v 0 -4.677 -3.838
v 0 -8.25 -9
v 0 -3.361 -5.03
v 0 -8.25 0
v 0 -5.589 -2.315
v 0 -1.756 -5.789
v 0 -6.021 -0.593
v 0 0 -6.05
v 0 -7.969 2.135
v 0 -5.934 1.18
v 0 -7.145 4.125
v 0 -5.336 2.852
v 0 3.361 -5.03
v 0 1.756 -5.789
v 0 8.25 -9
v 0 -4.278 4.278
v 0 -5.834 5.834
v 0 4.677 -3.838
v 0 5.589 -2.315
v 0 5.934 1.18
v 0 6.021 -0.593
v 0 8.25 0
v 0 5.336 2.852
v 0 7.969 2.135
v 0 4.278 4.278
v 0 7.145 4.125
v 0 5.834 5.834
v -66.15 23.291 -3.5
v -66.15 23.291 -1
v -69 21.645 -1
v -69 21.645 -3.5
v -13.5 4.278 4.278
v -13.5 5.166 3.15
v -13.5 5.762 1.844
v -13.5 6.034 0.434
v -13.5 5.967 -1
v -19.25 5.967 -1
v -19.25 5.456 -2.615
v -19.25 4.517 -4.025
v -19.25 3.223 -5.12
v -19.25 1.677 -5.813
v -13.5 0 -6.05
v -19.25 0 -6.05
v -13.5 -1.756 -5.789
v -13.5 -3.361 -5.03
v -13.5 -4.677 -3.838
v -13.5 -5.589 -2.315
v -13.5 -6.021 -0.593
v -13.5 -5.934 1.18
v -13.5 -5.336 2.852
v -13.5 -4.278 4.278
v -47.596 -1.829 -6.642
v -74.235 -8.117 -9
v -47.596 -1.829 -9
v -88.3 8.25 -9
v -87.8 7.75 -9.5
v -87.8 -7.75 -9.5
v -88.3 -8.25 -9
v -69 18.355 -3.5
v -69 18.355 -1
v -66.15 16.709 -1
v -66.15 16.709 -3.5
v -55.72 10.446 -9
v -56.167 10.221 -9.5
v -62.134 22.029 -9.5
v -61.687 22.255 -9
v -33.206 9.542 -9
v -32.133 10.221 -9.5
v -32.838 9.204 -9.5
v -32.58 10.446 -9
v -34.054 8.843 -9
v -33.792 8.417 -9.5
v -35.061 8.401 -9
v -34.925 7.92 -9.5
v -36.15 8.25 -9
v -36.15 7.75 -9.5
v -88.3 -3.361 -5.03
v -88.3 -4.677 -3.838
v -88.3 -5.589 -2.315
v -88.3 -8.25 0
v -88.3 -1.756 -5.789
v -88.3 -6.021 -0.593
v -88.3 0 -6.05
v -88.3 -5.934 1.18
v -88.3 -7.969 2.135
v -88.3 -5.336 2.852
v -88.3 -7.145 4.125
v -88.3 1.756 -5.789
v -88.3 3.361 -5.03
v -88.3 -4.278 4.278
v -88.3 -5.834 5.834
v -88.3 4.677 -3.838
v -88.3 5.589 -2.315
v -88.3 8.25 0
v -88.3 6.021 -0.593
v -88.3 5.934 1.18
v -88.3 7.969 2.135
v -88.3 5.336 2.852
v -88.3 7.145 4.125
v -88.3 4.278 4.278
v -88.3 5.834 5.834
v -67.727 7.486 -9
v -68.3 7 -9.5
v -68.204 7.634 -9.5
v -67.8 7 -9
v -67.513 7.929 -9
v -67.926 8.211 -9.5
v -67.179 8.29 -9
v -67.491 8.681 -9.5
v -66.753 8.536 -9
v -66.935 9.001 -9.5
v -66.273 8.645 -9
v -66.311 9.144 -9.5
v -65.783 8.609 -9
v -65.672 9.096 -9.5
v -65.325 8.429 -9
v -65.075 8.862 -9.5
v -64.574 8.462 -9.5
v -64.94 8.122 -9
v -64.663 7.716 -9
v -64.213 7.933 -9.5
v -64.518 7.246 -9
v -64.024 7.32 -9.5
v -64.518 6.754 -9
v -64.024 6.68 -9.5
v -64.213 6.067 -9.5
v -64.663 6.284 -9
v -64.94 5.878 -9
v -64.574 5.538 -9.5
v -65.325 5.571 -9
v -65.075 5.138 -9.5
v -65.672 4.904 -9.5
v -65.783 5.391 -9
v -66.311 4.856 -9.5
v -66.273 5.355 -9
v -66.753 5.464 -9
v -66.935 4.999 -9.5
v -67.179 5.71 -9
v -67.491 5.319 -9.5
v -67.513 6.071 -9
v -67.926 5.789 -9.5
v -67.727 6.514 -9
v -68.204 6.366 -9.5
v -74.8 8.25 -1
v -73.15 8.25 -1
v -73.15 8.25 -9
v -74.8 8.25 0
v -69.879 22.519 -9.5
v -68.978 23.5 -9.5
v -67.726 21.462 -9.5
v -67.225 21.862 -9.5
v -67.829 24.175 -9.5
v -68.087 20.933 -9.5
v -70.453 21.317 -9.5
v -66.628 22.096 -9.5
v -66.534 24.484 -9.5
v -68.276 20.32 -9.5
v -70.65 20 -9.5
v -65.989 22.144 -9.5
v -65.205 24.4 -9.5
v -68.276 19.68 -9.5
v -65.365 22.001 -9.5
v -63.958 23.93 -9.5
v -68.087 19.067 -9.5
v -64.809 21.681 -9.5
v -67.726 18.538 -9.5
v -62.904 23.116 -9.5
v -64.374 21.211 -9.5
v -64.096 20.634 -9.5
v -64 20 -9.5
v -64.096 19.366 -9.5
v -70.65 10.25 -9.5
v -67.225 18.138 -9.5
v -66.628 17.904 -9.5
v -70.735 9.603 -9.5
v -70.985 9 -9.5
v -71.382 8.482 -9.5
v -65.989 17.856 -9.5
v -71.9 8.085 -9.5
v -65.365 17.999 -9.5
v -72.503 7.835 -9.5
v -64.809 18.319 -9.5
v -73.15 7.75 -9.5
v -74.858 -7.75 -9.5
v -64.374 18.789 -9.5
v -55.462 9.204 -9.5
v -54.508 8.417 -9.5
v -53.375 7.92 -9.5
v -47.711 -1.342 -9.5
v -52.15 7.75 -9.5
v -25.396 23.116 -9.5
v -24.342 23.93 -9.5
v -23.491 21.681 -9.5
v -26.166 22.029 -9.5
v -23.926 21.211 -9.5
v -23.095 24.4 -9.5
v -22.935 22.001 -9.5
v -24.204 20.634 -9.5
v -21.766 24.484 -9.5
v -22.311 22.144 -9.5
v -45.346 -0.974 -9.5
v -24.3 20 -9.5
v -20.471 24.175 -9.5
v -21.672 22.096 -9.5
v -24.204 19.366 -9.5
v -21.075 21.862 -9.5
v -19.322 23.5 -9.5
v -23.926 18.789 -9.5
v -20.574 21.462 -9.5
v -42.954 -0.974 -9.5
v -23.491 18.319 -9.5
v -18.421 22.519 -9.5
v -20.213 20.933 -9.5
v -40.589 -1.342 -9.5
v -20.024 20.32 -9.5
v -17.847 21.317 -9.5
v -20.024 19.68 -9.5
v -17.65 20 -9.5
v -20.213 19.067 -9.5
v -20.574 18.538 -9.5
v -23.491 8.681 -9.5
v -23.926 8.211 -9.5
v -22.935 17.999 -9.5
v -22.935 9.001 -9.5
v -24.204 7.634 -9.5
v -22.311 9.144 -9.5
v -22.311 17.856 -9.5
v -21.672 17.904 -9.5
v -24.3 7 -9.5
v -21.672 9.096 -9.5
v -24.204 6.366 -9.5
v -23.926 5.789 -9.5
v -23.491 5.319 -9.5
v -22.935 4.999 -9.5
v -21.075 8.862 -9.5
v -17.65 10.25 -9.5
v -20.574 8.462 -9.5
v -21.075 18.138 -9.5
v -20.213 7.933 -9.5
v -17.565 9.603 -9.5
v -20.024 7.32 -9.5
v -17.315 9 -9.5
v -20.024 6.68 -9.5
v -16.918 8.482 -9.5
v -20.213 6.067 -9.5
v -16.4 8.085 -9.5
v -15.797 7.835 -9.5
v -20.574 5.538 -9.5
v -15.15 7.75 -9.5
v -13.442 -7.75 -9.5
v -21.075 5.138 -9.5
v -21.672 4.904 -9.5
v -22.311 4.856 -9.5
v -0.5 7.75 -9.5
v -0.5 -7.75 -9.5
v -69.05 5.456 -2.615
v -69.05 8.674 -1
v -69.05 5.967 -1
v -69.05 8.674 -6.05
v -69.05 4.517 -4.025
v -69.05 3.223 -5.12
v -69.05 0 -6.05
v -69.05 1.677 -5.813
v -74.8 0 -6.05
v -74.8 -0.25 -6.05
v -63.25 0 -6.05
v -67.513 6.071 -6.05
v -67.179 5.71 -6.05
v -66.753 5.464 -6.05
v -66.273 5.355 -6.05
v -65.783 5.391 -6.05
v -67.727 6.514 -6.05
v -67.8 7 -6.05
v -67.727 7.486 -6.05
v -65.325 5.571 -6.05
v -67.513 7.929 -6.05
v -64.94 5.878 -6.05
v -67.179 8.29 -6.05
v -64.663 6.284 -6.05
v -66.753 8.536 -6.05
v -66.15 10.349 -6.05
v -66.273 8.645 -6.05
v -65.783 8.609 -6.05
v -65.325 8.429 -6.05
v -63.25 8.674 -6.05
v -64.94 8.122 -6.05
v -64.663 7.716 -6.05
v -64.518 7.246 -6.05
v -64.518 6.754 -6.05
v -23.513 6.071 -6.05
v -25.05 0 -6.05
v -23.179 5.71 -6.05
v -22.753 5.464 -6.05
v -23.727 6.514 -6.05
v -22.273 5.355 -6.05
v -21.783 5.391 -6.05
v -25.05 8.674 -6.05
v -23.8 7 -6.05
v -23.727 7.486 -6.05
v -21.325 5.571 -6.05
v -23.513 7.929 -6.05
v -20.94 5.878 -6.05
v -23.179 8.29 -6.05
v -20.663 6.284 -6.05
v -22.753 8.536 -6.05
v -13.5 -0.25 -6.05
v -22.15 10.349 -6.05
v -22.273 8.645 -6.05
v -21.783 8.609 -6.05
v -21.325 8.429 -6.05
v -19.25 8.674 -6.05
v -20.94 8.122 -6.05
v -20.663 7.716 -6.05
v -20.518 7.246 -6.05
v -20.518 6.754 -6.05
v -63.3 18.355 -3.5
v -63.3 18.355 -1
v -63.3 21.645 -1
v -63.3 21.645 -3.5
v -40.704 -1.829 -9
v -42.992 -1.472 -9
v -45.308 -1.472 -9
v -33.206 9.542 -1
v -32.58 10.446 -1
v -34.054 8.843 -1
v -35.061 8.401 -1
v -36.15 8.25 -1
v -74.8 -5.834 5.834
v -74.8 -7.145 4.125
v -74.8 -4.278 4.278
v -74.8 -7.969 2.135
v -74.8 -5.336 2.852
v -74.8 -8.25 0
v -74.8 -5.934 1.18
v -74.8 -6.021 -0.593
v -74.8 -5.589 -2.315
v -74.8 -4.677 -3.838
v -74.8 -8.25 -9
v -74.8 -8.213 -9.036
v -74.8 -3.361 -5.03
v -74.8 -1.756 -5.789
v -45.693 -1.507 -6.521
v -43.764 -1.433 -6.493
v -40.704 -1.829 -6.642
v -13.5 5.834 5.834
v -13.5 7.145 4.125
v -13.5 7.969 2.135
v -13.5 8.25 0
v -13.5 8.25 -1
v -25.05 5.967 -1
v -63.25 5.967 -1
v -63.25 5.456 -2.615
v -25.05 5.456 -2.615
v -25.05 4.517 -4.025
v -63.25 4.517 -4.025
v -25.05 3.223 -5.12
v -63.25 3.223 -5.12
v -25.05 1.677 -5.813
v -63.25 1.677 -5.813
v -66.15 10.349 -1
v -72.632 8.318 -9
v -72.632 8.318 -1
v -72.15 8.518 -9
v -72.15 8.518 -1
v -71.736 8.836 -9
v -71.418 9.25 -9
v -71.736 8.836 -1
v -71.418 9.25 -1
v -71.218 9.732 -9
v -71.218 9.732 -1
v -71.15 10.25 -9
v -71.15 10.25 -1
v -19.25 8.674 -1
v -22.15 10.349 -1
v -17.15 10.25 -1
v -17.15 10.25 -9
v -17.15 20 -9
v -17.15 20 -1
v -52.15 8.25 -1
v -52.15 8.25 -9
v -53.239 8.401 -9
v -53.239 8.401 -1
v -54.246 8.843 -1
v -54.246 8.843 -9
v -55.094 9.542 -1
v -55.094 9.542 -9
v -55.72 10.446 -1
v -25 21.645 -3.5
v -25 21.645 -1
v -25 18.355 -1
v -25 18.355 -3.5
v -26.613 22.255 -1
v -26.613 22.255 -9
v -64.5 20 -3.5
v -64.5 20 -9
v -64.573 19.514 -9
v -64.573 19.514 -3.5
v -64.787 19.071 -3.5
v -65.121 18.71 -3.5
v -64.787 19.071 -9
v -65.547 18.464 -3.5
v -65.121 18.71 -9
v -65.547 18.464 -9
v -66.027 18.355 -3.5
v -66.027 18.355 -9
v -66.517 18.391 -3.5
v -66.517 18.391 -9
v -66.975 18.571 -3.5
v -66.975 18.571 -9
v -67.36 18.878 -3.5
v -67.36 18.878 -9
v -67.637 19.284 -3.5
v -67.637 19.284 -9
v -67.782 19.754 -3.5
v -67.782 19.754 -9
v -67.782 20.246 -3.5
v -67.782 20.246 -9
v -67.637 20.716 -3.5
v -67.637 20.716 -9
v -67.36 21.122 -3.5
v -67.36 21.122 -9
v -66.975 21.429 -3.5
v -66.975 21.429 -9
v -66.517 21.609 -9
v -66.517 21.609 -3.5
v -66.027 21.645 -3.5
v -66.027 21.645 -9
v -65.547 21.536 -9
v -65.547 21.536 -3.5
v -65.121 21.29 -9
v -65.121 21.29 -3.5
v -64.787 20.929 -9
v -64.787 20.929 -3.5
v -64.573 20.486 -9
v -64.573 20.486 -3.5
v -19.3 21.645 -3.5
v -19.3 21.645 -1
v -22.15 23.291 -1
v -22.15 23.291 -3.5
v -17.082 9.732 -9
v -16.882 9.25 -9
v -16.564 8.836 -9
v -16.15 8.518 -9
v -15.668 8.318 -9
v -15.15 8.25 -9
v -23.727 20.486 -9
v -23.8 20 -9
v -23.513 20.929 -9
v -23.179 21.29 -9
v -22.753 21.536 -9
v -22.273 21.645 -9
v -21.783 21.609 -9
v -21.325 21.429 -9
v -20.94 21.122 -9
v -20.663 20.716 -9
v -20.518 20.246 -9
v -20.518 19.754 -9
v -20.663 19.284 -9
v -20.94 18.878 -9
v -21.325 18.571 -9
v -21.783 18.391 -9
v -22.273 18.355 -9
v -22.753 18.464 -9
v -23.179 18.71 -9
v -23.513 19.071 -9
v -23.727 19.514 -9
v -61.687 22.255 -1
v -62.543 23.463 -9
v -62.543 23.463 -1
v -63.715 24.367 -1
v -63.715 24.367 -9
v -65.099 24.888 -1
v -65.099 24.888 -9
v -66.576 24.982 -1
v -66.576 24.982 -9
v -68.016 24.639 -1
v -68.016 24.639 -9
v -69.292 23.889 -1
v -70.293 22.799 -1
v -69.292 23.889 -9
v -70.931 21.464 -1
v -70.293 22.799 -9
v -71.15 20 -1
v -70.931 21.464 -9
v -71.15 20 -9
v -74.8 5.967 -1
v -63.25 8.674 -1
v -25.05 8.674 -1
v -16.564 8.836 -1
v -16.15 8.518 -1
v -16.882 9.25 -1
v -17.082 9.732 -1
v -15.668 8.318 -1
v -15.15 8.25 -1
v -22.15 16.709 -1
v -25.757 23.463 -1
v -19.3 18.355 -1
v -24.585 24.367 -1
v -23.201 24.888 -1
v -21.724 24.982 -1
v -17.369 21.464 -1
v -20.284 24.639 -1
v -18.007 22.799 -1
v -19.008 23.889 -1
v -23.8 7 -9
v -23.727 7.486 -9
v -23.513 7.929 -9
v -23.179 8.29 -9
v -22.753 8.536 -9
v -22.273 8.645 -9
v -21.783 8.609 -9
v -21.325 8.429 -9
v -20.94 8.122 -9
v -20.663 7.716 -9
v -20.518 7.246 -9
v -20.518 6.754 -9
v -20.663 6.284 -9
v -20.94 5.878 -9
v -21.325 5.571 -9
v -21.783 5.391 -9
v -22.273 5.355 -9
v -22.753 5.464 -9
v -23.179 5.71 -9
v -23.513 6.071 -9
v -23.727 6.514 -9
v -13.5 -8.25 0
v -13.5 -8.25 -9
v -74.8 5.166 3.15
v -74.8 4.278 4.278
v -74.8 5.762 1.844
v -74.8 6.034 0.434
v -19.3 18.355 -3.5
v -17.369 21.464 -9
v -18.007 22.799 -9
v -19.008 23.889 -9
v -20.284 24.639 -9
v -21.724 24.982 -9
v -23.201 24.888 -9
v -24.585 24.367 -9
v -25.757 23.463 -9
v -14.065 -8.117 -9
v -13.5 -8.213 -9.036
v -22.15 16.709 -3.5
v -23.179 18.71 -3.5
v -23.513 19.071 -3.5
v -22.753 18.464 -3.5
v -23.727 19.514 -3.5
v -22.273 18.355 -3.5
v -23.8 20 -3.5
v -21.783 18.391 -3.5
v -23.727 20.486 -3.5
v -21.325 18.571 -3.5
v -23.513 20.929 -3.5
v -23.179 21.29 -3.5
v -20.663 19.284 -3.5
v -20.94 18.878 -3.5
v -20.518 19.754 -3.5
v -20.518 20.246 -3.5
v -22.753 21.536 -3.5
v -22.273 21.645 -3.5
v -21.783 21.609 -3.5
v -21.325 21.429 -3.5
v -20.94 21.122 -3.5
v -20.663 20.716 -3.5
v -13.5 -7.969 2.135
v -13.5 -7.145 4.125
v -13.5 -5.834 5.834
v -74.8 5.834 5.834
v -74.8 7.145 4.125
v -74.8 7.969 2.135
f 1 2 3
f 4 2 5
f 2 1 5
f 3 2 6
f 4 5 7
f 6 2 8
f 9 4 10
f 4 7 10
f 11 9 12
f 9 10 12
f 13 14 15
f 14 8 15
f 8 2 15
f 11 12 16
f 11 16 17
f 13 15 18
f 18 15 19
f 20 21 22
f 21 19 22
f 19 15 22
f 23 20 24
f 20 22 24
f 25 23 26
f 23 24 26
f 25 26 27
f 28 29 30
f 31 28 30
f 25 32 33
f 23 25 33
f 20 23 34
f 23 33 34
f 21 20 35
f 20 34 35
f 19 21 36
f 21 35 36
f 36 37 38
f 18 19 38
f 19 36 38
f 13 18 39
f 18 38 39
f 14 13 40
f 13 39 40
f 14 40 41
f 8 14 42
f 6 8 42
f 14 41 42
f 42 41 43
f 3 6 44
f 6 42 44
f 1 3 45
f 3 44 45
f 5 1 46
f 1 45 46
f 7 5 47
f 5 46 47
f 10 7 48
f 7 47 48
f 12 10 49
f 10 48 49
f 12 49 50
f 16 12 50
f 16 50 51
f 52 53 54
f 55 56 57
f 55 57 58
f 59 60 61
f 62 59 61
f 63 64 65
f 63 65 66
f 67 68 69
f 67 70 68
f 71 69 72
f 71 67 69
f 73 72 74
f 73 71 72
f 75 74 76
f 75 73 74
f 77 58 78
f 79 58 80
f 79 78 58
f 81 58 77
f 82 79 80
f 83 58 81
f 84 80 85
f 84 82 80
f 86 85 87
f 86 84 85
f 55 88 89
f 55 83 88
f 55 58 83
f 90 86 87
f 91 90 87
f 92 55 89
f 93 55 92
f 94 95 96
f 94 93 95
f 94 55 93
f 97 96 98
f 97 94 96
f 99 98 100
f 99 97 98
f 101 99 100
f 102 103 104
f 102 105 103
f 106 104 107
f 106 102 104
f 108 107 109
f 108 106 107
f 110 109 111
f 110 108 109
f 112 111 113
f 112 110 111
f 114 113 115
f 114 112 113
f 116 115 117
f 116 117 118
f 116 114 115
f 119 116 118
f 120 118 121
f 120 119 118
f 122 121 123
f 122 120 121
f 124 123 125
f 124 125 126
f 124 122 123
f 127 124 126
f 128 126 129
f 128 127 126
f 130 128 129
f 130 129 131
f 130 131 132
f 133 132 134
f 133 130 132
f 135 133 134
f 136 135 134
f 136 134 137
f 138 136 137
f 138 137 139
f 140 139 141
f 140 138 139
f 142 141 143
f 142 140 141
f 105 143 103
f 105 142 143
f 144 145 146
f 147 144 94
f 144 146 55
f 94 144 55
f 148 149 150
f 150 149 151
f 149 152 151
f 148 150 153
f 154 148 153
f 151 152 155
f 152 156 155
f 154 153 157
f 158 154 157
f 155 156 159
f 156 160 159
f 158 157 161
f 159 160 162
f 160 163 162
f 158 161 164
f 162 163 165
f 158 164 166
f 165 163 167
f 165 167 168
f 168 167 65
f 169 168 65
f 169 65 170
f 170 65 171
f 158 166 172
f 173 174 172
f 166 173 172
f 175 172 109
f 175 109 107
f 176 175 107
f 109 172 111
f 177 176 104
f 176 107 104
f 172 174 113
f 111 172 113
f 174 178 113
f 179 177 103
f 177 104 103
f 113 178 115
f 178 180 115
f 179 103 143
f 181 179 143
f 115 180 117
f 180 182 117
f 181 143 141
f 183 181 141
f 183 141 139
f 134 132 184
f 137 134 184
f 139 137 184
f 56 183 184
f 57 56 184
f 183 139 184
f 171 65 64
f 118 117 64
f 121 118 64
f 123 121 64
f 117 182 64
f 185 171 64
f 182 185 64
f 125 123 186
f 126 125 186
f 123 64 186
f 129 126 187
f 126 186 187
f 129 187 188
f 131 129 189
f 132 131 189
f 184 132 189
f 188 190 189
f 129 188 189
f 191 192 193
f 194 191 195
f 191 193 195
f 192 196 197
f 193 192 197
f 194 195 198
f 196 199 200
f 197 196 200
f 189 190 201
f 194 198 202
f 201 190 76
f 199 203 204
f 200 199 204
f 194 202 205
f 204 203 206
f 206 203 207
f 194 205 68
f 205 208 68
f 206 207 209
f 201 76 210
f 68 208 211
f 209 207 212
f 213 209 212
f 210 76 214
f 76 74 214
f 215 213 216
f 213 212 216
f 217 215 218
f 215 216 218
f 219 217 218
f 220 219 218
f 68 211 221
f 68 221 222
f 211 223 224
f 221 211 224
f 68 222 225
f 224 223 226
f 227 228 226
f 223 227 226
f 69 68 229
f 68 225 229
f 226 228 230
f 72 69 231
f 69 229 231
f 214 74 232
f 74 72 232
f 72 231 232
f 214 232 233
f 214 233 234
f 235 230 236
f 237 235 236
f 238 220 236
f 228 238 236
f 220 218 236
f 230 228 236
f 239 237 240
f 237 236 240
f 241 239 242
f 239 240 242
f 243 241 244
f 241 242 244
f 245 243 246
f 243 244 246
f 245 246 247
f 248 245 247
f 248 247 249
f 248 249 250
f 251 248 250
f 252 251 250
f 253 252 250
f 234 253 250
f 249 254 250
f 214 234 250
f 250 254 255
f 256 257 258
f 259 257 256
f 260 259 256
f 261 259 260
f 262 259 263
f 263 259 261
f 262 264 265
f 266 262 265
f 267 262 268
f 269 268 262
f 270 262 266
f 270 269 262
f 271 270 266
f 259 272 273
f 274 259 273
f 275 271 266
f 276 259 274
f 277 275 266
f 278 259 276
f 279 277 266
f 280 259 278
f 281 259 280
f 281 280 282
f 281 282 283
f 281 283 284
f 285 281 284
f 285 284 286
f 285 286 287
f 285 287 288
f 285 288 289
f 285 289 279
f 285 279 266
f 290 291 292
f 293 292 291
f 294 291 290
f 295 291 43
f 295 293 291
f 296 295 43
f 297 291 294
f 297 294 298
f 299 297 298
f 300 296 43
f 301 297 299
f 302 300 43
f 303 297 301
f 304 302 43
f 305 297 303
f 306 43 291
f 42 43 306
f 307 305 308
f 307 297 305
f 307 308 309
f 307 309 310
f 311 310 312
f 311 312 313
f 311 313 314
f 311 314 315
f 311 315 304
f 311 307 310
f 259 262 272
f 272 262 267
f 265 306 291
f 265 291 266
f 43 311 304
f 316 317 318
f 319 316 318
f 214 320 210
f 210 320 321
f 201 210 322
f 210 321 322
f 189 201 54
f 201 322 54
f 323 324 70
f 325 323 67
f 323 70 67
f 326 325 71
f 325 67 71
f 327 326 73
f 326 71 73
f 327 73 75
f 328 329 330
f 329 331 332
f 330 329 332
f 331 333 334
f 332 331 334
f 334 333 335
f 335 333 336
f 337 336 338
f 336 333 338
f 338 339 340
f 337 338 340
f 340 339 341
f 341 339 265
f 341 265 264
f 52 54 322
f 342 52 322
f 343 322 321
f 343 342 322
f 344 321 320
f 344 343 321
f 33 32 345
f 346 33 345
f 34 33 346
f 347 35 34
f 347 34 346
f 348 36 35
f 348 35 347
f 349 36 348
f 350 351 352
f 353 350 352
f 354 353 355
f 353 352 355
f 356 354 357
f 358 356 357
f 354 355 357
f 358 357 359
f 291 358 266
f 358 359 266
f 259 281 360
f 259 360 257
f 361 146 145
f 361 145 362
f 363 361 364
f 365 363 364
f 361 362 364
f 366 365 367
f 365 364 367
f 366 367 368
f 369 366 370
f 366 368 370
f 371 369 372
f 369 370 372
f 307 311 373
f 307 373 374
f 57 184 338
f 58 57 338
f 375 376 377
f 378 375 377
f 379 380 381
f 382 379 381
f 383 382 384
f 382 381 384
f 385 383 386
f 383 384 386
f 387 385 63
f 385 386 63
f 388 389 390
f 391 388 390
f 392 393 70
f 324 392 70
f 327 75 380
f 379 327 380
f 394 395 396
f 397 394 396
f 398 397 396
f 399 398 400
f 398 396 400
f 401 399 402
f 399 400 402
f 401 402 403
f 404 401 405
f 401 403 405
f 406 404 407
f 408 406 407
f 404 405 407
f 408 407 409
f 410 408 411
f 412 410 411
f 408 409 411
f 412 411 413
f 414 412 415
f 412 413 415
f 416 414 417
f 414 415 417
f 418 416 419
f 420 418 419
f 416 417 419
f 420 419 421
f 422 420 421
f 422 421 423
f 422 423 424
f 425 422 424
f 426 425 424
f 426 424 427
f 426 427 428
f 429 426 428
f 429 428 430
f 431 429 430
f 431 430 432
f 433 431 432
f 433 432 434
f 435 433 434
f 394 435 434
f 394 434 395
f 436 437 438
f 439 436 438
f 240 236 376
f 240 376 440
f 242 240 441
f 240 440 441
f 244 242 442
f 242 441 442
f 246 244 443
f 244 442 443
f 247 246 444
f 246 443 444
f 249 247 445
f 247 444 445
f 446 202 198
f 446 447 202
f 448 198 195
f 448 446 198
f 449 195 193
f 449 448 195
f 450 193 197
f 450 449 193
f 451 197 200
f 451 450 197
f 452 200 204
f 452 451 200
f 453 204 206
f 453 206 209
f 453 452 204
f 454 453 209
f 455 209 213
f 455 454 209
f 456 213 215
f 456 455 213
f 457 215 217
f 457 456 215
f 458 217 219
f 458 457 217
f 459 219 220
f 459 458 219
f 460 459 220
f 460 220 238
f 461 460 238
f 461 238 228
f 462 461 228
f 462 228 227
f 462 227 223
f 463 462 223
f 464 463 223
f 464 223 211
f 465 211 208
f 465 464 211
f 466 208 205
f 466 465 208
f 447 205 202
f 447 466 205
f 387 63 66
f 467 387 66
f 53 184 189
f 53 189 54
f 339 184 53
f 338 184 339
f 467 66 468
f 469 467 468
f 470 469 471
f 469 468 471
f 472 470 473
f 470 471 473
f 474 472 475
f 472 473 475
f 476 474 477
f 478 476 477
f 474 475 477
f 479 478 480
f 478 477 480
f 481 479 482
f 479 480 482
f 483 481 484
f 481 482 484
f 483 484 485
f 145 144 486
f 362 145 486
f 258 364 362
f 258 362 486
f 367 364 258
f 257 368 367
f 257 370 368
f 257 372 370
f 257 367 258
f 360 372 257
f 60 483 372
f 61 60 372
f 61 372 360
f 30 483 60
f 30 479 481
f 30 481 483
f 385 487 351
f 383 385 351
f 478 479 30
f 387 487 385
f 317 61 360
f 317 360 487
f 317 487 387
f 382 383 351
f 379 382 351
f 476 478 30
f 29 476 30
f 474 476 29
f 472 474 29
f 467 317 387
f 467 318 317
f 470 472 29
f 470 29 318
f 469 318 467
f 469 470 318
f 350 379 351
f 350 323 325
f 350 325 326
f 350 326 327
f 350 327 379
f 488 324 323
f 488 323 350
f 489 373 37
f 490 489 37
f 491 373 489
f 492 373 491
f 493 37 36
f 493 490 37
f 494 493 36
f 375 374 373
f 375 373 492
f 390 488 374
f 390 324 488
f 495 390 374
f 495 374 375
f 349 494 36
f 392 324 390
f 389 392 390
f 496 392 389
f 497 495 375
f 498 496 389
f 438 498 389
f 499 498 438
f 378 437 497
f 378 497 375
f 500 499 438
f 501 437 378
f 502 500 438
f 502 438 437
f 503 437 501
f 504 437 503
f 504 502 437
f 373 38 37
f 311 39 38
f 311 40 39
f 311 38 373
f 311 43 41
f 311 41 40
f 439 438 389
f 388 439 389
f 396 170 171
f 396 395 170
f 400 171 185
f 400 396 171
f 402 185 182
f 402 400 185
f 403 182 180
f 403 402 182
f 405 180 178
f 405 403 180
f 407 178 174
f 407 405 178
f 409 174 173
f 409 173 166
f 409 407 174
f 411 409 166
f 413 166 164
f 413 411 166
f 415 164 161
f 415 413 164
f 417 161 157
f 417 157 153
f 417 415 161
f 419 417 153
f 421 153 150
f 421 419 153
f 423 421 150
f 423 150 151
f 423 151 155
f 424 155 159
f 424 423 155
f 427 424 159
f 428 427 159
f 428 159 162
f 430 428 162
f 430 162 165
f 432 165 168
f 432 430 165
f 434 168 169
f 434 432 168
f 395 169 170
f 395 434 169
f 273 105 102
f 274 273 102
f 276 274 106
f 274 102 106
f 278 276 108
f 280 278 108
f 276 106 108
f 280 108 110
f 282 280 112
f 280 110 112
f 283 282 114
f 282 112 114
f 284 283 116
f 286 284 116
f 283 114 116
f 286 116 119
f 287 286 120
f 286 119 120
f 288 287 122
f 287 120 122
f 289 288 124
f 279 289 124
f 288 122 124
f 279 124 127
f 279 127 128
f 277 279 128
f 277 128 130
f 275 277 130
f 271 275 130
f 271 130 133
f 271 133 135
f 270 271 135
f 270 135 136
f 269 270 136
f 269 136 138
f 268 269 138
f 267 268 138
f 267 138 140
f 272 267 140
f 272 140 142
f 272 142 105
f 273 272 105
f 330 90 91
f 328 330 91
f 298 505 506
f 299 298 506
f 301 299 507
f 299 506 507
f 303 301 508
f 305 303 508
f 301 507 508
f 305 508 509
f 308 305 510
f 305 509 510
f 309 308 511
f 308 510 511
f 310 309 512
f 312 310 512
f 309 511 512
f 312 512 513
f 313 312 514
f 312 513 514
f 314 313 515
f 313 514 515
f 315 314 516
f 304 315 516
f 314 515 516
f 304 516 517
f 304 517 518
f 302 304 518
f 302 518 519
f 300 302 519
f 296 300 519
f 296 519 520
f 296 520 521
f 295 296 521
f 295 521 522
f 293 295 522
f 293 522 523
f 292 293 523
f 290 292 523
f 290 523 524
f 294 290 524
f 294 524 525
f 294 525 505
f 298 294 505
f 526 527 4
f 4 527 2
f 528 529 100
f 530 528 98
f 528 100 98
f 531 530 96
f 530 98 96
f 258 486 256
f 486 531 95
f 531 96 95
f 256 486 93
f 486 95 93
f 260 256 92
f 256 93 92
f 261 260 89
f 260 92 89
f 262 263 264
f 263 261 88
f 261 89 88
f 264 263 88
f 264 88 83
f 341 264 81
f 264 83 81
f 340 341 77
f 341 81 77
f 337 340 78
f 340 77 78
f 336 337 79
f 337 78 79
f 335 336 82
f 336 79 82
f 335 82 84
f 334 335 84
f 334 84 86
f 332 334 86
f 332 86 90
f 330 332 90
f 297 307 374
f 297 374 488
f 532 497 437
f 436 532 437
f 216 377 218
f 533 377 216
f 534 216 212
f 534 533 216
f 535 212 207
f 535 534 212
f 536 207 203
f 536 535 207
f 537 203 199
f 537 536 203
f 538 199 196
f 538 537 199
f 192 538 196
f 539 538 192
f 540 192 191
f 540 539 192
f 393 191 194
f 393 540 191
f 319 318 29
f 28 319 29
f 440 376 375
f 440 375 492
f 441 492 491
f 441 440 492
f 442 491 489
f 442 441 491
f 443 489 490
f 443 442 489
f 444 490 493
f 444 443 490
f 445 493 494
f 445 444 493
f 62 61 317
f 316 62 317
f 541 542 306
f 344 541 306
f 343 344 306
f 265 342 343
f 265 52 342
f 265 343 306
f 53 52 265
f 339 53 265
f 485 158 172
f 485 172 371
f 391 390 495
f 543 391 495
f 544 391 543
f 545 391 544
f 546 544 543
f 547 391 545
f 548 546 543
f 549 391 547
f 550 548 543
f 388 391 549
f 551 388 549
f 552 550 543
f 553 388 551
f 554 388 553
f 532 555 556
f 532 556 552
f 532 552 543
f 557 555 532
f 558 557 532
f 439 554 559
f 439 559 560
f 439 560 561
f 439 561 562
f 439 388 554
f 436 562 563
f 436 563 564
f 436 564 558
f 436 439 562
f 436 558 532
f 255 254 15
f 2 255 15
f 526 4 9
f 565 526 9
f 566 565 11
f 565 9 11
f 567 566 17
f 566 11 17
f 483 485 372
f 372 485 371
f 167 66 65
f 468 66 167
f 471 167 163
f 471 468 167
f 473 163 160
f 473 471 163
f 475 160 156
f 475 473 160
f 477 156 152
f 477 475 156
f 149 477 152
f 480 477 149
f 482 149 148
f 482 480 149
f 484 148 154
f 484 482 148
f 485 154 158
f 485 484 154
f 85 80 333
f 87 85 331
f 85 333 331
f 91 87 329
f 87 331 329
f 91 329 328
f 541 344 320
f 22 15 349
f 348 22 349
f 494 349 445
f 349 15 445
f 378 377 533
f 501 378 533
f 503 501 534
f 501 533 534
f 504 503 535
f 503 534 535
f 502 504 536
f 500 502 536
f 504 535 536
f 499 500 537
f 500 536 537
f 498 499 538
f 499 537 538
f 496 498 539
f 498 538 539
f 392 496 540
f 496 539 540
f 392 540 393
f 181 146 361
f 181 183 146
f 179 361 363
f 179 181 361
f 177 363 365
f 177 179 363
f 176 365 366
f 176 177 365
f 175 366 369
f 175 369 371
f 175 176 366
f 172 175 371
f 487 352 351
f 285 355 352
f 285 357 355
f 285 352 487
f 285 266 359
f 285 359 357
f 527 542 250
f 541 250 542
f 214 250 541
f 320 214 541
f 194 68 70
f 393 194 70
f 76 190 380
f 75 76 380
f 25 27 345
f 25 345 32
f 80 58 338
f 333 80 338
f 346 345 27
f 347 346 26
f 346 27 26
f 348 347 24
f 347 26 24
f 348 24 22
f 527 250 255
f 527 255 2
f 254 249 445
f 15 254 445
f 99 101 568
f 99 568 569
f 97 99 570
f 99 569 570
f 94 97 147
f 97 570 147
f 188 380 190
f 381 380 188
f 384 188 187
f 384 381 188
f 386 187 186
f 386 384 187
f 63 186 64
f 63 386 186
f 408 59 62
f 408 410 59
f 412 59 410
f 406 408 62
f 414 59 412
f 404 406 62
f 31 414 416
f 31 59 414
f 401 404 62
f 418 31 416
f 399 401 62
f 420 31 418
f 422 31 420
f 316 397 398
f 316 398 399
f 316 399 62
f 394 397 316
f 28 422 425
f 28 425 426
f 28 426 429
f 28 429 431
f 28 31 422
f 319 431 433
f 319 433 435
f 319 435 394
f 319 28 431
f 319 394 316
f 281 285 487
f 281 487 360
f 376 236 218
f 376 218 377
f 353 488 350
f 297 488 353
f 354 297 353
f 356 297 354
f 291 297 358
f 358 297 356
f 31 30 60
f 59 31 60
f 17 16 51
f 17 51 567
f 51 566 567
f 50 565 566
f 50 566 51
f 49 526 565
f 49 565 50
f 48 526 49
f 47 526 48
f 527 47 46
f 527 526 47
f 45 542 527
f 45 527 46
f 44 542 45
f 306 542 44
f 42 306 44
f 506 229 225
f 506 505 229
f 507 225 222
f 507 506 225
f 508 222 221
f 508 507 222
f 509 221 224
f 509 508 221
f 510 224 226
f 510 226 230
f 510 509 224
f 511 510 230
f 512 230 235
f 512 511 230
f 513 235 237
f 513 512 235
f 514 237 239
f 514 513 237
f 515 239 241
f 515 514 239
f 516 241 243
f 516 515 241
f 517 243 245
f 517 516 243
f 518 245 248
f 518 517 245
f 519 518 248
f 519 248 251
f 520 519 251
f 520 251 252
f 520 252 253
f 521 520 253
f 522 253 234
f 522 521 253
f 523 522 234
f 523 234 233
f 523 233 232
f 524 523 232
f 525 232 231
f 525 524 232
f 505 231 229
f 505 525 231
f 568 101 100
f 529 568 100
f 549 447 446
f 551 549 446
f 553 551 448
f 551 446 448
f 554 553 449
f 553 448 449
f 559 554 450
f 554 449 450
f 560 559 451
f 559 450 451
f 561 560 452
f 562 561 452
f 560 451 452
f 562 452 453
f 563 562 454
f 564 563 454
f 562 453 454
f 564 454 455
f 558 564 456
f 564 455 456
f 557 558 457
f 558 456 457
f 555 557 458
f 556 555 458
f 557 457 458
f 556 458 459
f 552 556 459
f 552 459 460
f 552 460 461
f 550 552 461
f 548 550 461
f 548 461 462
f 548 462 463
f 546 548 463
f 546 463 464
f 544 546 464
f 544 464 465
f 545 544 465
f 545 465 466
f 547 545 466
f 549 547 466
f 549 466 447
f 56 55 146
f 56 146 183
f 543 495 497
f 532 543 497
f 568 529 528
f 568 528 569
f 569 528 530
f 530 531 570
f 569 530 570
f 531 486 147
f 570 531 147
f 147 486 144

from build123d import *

# Parameters (mm, degrees)
BOSS_EXTRUDE1_DEPTH = 88.3
SKETCH6_R           = 1.65
BOSS_EXTRUDE2_DEPTH = 8.5
CUT_EXTRUDE1_DEPTH  = 93.261259475
SKETCH8_W           = 61.3
SKETCH8_H           = 21.483950942
CUT_EXTRUDE2_DEPTH  = 93.163658782
SKETCH9_W           = 61.3
SKETCH9_H           = 11.699409457
CUT_EXTRUDE3_DEPTH  = 93.53707735
SKETCH10_R          = 1.65
CUT_EXTRUDE4_DEPTH  = 94.043055829
CHAMFER1_SIZE       = 8
CHAMFER1_SIZE2      = 3
CUT_EXTRUDE5_DEPTH  = 93.537077445
FILLET1_R           = 2
CUT_EXTRUDE7_START  = -5.05
CUT_EXTRUDE7_DEPTH  = 5.05
CUT_EXTRUDE8_DEPTH  = 2.5
CHAMFER2_SIZE       = 0.5


with BuildPart() as part:
    # Sketch1 → Boss-Extrude1 (new body)
    with BuildSketch(Plane.ZY):
        with BuildLine():
            Line((-9.5, 8.25), (-9.5, -8.25))
            Line((-9.5, -8.25), (0, -8.25))
            ThreePointArc((0, -8.25), (8.25, 0), (0, 8.25))
            Line((0, 8.25), (-9.5, 8.25))
        make_face()
    extrude(amount=BOSS_EXTRUDE1_DEPTH)

    # Sketch6 → Boss-Extrude2 (add)
    with BuildSketch(Plane(origin=(0, 0, -9.5), x_dir=(-1, 0, 0), z_dir=(0, 0, -1))):
        with BuildLine():
            Line((17.15, -8.25), (17.15, 20))
            ThreePointArc((17.15, 20), (20.99096395, 24.863808737), (26.612654174, 22.254931867))
            Line((26.612654174, 22.254931867), (32.579554775, 10.446054507))
            ThreePointArc((32.579554775, 10.446054507), (34.053942202, 8.842964487), (36.149678114, 8.25))
            Line((36.149678114, 8.25), (52.150321886, 8.25))
            ThreePointArc((52.150321886, 8.25), (54.246057798, 8.842964487), (55.720445225, 10.446054507))
            Line((55.720445225, 10.446054507), (61.687345826, 22.254931867))
            ThreePointArc((61.687345826, 22.254931867), (67.30903605, 24.863808737), (71.15, 20))
            Line((71.15, 20), (71.15, -8.25))
            Line((71.15, -8.25), (17.15, -8.25))
        make_face()
        with Locations((22.15, 20)):
            Circle(SKETCH6_R, mode=Mode.SUBTRACT)
        with Locations(Location((66.15, 20, 0), (0, 0, 180))):
            Circle(SKETCH6_R, mode=Mode.SUBTRACT)
    extrude(amount=-BOSS_EXTRUDE2_DEPTH)

    # Sketch7 → Cut-Extrude1 (cut, through all)
    with BuildSketch(Plane.ZY.offset(88.3)):
        with BuildLine():
            Line((13.481907846, 13.481907846), (4.277996026, 4.277996026))
            ThreePointArc((4.277996026, 4.277996026), (-6.05, 0), (4.277996026, -4.277996026))
            Line((4.277996026, -4.277996026), (13.481907846, -13.481907846))
            Line((13.481907846, -13.481907846), (13.481907846, 13.481907846))
        make_face()
    extrude(amount=-CUT_EXTRUDE1_DEPTH, mode=Mode.SUBTRACT)

    # Sketch8 → Cut-Extrude2 (cut, through all)
    with BuildSketch(Plane.XY.offset(-1)):
        with Locations((-44.15, -2.491975471)):
            Rectangle(SKETCH8_W, SKETCH8_H)
    extrude(amount=CUT_EXTRUDE2_DEPTH, mode=Mode.SUBTRACT)

    # Sketch9 → Cut-Extrude3 (cut, through all)
    with BuildSketch(Plane(origin=(0, 0, -6.05), x_dir=(-1, 0, 0), z_dir=(0, 0, -1))):
        with Locations((44.15, -5.849704729)):
            Rectangle(SKETCH9_W, SKETCH9_H)
    extrude(amount=-CUT_EXTRUDE3_DEPTH, mode=Mode.SUBTRACT)

    # Sketch10 → Cut-Extrude4 (cut, through all)
    with BuildSketch(Plane(origin=(0, 0, -9.5), x_dir=(-1, 0, 0), z_dir=(0, 0, -1))):
        with Locations((22.15, 7)):
            Circle(SKETCH10_R)
        with Locations((66.15, 7)):
            Circle(SKETCH10_R)
    extrude(amount=-CUT_EXTRUDE4_DEPTH, mode=Mode.SUBTRACT)

    # Chamfer1
    chamfer1_edges = [part.edges().sort_by_distance(p)[0] for p in [
        (-44.15, -8.25, -6.05),
    ]]
    chamfer1_side = [part.faces().sort_by_distance(p)[0] for p in [
        (-44.15, -4.125, -6.05),
    ]]
    chamfer(chamfer1_edges, length=CHAMFER1_SIZE, length2=CHAMFER1_SIZE2, reference=chamfer1_side[0])

    # Sketch11 → Cut-Extrude5 (cut, through all)
    with BuildSketch(Plane(origin=(0, 0, -6.05), x_dir=(-1, 0, 0), z_dir=(0, 0, -1))):
        with BuildLine():
            Line((74.8, -8.25), (47.5958626, -1.828822614))
            ThreePointArc((47.5958626, -1.828822614), (44.15, -1.427659244), (40.7041374, -1.828822614))
            Line((40.7041374, -1.828822614), (13.5, -8.25))
            Line((13.5, -8.25), (13.5, -16.427659244))
            Line((13.5, -16.427659244), (74.8, -16.427659244))
            Line((74.8, -16.427659244), (74.8, -8.25))
        make_face()
    extrude(amount=CUT_EXTRUDE5_DEPTH, mode=Mode.SUBTRACT)

    # Fillet1
    fillet1_edges = [part.edges().sort_by_distance(p)[0] for p in [
        (-17.15, 8.25, -5.25),
        (-71.15, 8.25, -5.25),
    ]]
    fillet(fillet1_edges, radius=FILLET1_R)

    # Sketch13 → Cut-Extrude7 (cut)
    with BuildSketch(Plane.XY.offset(-1).offset(CUT_EXTRUDE7_START)):
        Polygon((-69.05, -2.12397244), (-63.25, -2.12397244), (-63.25, 8.674315781), (-66.15, 10.348631561), (-69.05, 8.674315781), align=None)
        Polygon((-25.05, -2.12397244), (-19.25, -2.12397244), (-19.25, 8.674315781), (-22.15, 10.348631561), (-25.05, 8.674315781), align=None)
    extrude(amount=CUT_EXTRUDE7_DEPTH, mode=Mode.SUBTRACT)

    # Sketch14 → Cut-Extrude8 (cut)
    with BuildSketch(Plane.XY.offset(-1)):
        Polygon((-69, 21.645448267), (-69, 18.354551733), (-66.15, 16.709103466), (-63.3, 18.354551733), (-63.3, 21.645448267), (-66.15, 23.290896534), align=None)
        Polygon((-22.15, 23.290896534), (-25, 21.645448267), (-25, 18.354551733), (-22.15, 16.709103466), (-19.3, 18.354551733), (-19.3, 21.645448267), align=None)
    extrude(amount=-CUT_EXTRUDE8_DEPTH, mode=Mode.SUBTRACT)

    # Chamfer2
    # the kernel refuses this chamfer: 0.5 mm, written as the material it takes off along each edge
    with BuildSketch(Plane(origin=(-88.3, 9.535841494, -9.5), x_dir=(0.9996219169112968, 0, -0.02749587661058574), z_dir=(0, -1, 0))) as chamfer2_piece_1:
        Polygon((CHAMFER2_SIZE * 0.999621916911, CHAMFER2_SIZE * 0.0274958766106), (-CHAMFER2_SIZE * 0.0274958766106, CHAMFER2_SIZE * 0.999621916911), (0, 0), align=None)
    extrude(amount=19.071682988, mode=Mode.SUBTRACT)
    with BuildSketch(Plane(origin=(-22.15, 7, -9.5), x_dir=(-1, 0, 0), z_dir=(0, -1, 0))) as chamfer2_piece_2:
        Polygon((1.65 + CHAMFER2_SIZE, 0), (1.65, -CHAMFER2_SIZE), (1.65, 0), align=None)
    revolve(axis=Axis((-22.15, 7, -9.5), (0, 0, -1)), mode=Mode.SUBTRACT)
    with BuildSketch(Plane(origin=(-66.15, 7, -9.5), x_dir=(-1, 0, 0), z_dir=(0, -1, 0))) as chamfer2_piece_3:
        Polygon((1.65 + CHAMFER2_SIZE, 0), (1.65, -CHAMFER2_SIZE), (1.65, 0), align=None)
    revolve(axis=Axis((-66.15, 7, -9.5), (0, 0, -1)), mode=Mode.SUBTRACT)
    with BuildSketch(Plane(origin=(-36.149678114, 8.25, -9.5), x_dir=(0, -0.9996219169112968, -0.027495876610585647), z_dir=(-1, 0, 0))) as chamfer2_piece_4:
        Polygon((CHAMFER2_SIZE * 0.999621916911, CHAMFER2_SIZE * 0.0274958766106), (-CHAMFER2_SIZE * 0.0274958766106, CHAMFER2_SIZE * 0.999621916911), (0, 0), align=None)
    extrude(amount=16.000643772, mode=Mode.SUBTRACT)
    with BuildSketch(Plane(origin=(1.285841494, -8.25, -9.5), x_dir=(0, 0.9996219169112968, -0.027495876610585647), z_dir=(-1, 0, 0)), Plane(origin=(-73.514158506, -8.25, -9.5), x_dir=(0, 0.9996219169112968, -0.027495876610585647), z_dir=(-1, 0, 0))) as chamfer2_piece_5:
        Polygon((CHAMFER2_SIZE * 0.999621916911, -CHAMFER2_SIZE * 0.0274958766106), (-CHAMFER2_SIZE * 0.0274958766106, -CHAMFER2_SIZE * 0.999621916911), (0, 0), align=None)
    extrude(amount=16.071682988, mode=Mode.SUBTRACT)
    with BuildSketch(Plane(origin=(-76.05145266, -8.545388874, -9.5), x_dir=(-0.22963731849575525, 0.9728878037695274, -0.027495876610585463), z_dir=(0.9732557753191584, 0.22972417332075415, 0)), Plane(origin=(-40.7041374, -1.828822614, -9.5), x_dir=(0.22963731849575528, 0.9728878037695274, -0.027495876610585706), z_dir=(0.9732557753191584, -0.2297241733207542, 0))) as chamfer2_piece_6:
        Polygon((CHAMFER2_SIZE * 0.999621916911, CHAMFER2_SIZE * 0.0274958766106), (-CHAMFER2_SIZE * 0.0274958766106, CHAMFER2_SIZE * 0.999621916911), (0, 0), align=None)
    extrude(amount=29.237524998, mode=Mode.SUBTRACT)
    with BuildSketch(Plane(origin=(-44.15, -16.427659244, -9.5), x_dir=(0.22972417332075398, 0.9732557753191584, 0), z_dir=(0.9732557753191584, -0.22972417332075398, 0))) as chamfer2_piece_7:
        Polygon((15 + CHAMFER2_SIZE, 0), (15, CHAMFER2_SIZE), (15, 0), align=None)
    revolve(axis=Axis((-44.15, -16.427659244, -9.5), (0, 0, 1)), revolution_arc=26.561666454, mode=Mode.SUBTRACT)
    with BuildSketch(Plane(origin=(-71.15, 20, -9.5), x_dir=(0.9996219169112968, 0, -0.02749587661058574), z_dir=(0, -1, 0)), Plane(origin=(-17.15, 10.25, -9.5), x_dir=(-0.9996219169112968, 0, -0.02749587661058555), z_dir=(0, 1, 0))) as chamfer2_piece_8:
        Polygon((CHAMFER2_SIZE * 0.999621916911, CHAMFER2_SIZE * 0.0274958766106), (-CHAMFER2_SIZE * 0.0274958766106, CHAMFER2_SIZE * 0.999621916911), (0, 0), align=None)
    extrude(amount=9.75, mode=Mode.SUBTRACT)
    with BuildSketch(Plane(origin=(1.285841494, 8.25, -9.5), x_dir=(0, -0.9996219169112968, -0.027495876610585647), z_dir=(-1, 0, 0))) as chamfer2_piece_9:
        Polygon((CHAMFER2_SIZE * 0.999621916911, CHAMFER2_SIZE * 0.0274958766106), (-CHAMFER2_SIZE * 0.0274958766106, CHAMFER2_SIZE * 0.999621916911), (0, 0), align=None)
    extrude(amount=16.435841494, mode=Mode.SUBTRACT)
    with BuildSketch(Plane(origin=(-73.15, 10.25, -9.5), x_dir=(0, -1, 0), z_dir=(-1, 0, 0))) as chamfer2_piece_10:
        Polygon((2, CHAMFER2_SIZE), (2 + CHAMFER2_SIZE, 0), (2, 0), align=None)
    revolve(axis=Axis((-73.15, 10.25, -9.5), (0, 0, 1)), revolution_arc=90, mode=Mode.SUBTRACT)
    with BuildSketch(Plane(origin=(-15.15, 10.25, -9.5), x_dir=(-1, 0, 0), z_dir=(0, 1, 0))) as chamfer2_piece_11:
        Polygon((2 + CHAMFER2_SIZE, 0), (2, CHAMFER2_SIZE), (2, 0), align=None)
    revolve(axis=Axis((-15.15, 10.25, -9.5), (0, 0, 1)), revolution_arc=90, mode=Mode.SUBTRACT)
    with BuildSketch(Plane(origin=(-36.149678114, 12.25, -9.5), x_dir=(0.8925308347817242, -0.45098637336824104, 0), z_dir=(0.45098637336824104, 0.8925308347817242, 0))) as chamfer2_piece_12:
        Polygon((4 + CHAMFER2_SIZE, 0), (4, -CHAMFER2_SIZE), (4, 0), align=None)
    revolve(axis=Axis((-36.149678114, 12.25, -9.5), (0, 0, -1)), revolution_arc=63.19301373, mode=Mode.SUBTRACT)
    with BuildSketch(Plane(origin=(-26.612654174, 22.254931867, -9.5), x_dir=(0.8921933839669467, -0.4508158630472358, -0.027495876610585532), z_dir=(-0.45098637336824193, -0.8925308347817238, 0)), Plane(origin=(-55.720445225, 10.446054507, -9.5), x_dir=(-0.8921933839669467, -0.4508158630472356, -0.027495876610585574), z_dir=(-0.45098637336824177, 0.8925308347817239, 0))) as chamfer2_piece_13:
        Polygon((CHAMFER2_SIZE * 0.999621916911, CHAMFER2_SIZE * 0.0274958766106), (-CHAMFER2_SIZE * 0.0274958766106, CHAMFER2_SIZE * 0.999621916911), (0, 0), align=None)
    extrude(amount=13.23077803, mode=Mode.SUBTRACT)
    with BuildSketch(Plane(origin=(-22.15, 20, -9.5), x_dir=(1, 0, 0), z_dir=(0, -1, 0))) as chamfer2_piece_14:
        Polygon((5 - CHAMFER2_SIZE, 0), (5, CHAMFER2_SIZE), (5, 0), align=None)
    revolve(axis=Axis((-22.15, 20, -9.5), (0, 0, 1)), revolution_arc=153.19301373, mode=Mode.SUBTRACT)
    with BuildSketch(Plane(origin=(-52.150321886, 12.25, -9.5), x_dir=(0, -1, 0), z_dir=(1, 0, 0))) as chamfer2_piece_15:
        Polygon((4 + CHAMFER2_SIZE, 0), (4, -CHAMFER2_SIZE), (4, 0), align=None)
    revolve(axis=Axis((-52.150321886, 12.25, -9.5), (0, 0, -1)), revolution_arc=63.19301373, mode=Mode.SUBTRACT)
    with BuildSketch(Plane(origin=(-66.15, 20, -9.5), x_dir=(0.892530834781725, 0.45098637336823943, 0), z_dir=(0.45098637336823943, -0.892530834781725, 0))) as chamfer2_piece_16:
        Polygon((5 - CHAMFER2_SIZE, 0), (5, CHAMFER2_SIZE), (5, 0), align=None)
    revolve(axis=Axis((-66.15, 20, -9.5), (0, 0, 1)), revolution_arc=153.19301373, mode=Mode.SUBTRACT)
    with BuildSketch(Plane(origin=(-22.15, 20, -9.5), x_dir=(-1, 0, 0), z_dir=(0, -1, 0))) as chamfer2_piece_17:
        Polygon((1.65 + CHAMFER2_SIZE, 0), (1.65, -CHAMFER2_SIZE), (1.65, 0), align=None)
    revolve(axis=Axis((-22.15, 20, -9.5), (0, 0, -1)), mode=Mode.SUBTRACT)
    with BuildSketch(Plane(origin=(-66.15, 20, -9.5), x_dir=(1, 0, 0), z_dir=(0, 1, 0))) as chamfer2_piece_18:
        Polygon((1.65 + CHAMFER2_SIZE, 0), (1.65, -CHAMFER2_SIZE), (1.65, 0), align=None)
    revolve(axis=Axis((-66.15, 20, -9.5), (0, 0, -1)), mode=Mode.SUBTRACT)
    with BuildSketch(Plane(origin=(0, 9.535841494, -9.5), x_dir=(-0.9996219169112968, 0, -0.02749587661058563), z_dir=(0, -1, 0))) as chamfer2_piece_19:
        Polygon((CHAMFER2_SIZE * 0.999621916911, -CHAMFER2_SIZE * 0.0274958766106), (-CHAMFER2_SIZE * 0.0274958766106, -CHAMFER2_SIZE * 0.999621916911), (0, 0), align=None)
    extrude(amount=19.071682988, mode=Mode.SUBTRACT)
    with BuildSketch(Plane(origin=(-73.15, 8.25, -9.5), x_dir=(0, 0.027495876610585647, 0.9996219169112968), z_dir=(-1, 0, 0))) as chamfer2_piece_20:
        Polygon((CHAMFER2_SIZE * 0.999621916911, -CHAMFER2_SIZE * 0.0274958766106), (-CHAMFER2_SIZE * 0.0274958766106, -CHAMFER2_SIZE * 0.999621916911), (0, 0), align=None)
    extrude(amount=16.435841494, mode=Mode.SUBTRACT)


solid = part.part
